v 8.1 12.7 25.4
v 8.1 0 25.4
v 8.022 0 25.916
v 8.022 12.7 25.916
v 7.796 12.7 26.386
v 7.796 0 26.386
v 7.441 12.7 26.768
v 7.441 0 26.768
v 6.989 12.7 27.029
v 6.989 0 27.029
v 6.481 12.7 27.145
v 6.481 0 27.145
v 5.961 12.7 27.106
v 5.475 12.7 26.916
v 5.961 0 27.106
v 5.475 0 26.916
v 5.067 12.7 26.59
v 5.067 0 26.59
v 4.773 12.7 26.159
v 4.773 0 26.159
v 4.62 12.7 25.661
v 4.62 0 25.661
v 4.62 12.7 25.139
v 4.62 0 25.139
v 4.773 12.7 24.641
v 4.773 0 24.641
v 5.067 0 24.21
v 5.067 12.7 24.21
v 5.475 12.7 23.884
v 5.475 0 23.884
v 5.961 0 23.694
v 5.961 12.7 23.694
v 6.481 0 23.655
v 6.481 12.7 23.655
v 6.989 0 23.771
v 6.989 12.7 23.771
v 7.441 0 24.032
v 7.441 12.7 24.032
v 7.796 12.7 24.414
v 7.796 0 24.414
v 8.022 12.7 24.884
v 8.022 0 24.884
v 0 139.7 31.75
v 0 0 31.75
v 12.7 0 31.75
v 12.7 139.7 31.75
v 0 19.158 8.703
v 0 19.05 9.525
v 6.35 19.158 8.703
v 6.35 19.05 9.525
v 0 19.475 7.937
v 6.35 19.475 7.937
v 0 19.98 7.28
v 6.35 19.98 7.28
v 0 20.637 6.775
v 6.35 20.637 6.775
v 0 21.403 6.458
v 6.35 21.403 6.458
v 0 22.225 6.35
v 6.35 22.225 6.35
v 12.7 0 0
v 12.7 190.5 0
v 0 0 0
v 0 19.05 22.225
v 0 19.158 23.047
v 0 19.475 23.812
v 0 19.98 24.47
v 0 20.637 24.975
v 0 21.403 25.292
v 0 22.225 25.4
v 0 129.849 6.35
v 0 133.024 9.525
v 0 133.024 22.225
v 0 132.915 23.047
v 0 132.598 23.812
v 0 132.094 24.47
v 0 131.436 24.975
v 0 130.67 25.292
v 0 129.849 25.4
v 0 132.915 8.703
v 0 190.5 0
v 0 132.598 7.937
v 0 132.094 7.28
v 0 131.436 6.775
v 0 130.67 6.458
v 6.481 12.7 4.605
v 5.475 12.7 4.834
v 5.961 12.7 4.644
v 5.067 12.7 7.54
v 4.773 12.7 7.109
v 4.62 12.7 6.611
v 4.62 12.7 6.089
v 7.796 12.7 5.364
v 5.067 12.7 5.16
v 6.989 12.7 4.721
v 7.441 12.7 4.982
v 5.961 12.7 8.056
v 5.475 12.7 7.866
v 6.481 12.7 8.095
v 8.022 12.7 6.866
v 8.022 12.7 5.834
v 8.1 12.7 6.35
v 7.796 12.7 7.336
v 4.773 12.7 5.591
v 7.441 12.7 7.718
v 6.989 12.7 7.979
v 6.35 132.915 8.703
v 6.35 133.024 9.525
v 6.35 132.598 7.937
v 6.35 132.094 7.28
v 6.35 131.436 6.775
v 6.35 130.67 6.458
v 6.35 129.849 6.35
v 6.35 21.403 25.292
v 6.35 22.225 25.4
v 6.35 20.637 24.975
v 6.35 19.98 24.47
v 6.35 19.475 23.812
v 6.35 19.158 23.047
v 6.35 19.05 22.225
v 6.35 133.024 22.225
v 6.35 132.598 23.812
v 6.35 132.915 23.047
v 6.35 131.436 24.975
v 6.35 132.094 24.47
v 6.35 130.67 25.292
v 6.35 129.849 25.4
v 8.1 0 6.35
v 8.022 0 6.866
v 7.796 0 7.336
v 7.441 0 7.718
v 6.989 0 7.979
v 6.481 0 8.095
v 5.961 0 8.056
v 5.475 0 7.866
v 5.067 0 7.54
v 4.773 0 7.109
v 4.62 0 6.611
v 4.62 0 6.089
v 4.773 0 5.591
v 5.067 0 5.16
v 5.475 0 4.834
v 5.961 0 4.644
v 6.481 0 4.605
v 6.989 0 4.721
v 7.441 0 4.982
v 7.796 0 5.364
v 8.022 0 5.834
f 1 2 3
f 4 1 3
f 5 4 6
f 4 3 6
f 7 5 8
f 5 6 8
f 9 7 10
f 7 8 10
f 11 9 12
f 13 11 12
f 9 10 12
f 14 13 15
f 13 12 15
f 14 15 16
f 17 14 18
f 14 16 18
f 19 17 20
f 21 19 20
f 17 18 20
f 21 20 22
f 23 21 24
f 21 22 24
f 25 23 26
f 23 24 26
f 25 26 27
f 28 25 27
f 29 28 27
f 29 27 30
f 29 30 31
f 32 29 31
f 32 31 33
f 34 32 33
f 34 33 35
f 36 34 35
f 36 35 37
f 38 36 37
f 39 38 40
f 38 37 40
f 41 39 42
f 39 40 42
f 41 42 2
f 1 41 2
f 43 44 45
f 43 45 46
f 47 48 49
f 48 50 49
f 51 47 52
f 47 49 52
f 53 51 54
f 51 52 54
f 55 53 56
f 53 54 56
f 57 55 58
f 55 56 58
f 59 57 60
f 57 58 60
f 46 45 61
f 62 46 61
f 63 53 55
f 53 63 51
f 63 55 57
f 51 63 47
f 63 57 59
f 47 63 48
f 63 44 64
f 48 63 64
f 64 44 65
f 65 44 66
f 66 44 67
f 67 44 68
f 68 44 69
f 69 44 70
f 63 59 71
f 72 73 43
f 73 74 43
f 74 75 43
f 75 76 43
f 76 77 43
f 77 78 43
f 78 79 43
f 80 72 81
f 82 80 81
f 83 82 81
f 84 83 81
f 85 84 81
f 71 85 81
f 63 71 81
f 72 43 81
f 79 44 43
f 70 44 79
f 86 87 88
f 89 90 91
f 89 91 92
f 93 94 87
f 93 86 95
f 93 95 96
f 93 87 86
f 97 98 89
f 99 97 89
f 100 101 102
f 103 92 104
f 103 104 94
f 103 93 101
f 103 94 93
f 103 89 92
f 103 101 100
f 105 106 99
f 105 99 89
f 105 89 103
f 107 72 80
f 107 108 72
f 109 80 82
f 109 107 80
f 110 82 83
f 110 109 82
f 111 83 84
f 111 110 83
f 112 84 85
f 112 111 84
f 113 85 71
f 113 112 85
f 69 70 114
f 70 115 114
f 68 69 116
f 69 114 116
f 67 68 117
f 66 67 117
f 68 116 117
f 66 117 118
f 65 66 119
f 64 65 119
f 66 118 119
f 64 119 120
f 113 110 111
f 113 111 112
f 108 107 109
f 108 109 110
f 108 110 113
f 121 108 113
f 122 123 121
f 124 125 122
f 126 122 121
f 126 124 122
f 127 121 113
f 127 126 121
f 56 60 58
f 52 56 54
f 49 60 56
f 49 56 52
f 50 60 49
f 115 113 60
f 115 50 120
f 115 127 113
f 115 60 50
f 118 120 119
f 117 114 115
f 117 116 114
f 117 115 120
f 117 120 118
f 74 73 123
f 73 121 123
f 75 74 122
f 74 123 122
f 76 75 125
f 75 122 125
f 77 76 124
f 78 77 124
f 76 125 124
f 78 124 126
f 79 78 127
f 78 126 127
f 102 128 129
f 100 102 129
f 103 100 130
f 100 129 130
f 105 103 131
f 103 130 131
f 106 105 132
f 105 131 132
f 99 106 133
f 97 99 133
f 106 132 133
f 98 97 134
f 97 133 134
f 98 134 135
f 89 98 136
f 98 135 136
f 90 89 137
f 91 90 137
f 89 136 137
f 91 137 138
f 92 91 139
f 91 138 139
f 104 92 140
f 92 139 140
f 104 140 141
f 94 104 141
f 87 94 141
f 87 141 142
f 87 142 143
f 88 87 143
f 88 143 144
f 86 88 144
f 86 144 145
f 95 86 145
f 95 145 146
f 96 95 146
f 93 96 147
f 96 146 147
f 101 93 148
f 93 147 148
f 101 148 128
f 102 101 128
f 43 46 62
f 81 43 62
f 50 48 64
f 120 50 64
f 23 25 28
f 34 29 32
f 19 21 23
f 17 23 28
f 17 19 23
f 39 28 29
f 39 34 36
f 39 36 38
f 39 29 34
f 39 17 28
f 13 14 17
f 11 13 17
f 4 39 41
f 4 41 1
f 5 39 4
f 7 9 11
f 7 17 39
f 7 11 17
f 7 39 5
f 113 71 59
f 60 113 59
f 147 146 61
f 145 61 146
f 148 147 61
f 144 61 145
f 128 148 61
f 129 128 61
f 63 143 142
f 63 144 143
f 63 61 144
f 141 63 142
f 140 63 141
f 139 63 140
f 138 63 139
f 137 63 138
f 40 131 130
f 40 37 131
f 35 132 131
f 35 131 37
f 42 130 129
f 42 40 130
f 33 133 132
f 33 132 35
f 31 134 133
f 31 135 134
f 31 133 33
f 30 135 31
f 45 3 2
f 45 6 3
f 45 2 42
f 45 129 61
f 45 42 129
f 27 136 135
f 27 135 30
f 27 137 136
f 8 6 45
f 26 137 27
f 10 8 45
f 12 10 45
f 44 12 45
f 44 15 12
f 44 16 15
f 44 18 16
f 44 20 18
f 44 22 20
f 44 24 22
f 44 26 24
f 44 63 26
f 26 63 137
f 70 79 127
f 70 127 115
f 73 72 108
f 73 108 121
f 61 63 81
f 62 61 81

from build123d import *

# Parameters (mm, degrees)
F0_W     = 190.5
F0_H     = 31.75
F1_DEPTH = 12.7
F3_DEPTH = 25.4
F4_R     = 1.75
F5_DEPTH = 12.7
F6_W     = 113.973523
F6_H     = 19.05
F7_DEPTH = 6.35
F8_R     = 3.175


with BuildPart() as f1:
    # F0 (on Right) → F1 (new body)
    with BuildSketch(Plane.YZ):
        with Locations((95.25, 15.875)):
            Rectangle(F0_W, F0_H)
    extrude(amount=F1_DEPTH)

    # F2 (on face) → F3 (cut)
    with BuildSketch(Plane.YZ.offset(12.7)):
        Polygon((139.7, 31.75), (190.5, 0), (190.5, 31.75), align=None)
    extrude(amount=-F3_DEPTH, mode=Mode.SUBTRACT)

    # F4 (on face) → F5 (cut)
    with BuildSketch(Plane.XZ):
        with Locations((6.35, 6.35)):
            Circle(F4_R)
        with Locations((6.35, 25.4)):
            Circle(F4_R)
    extrude(amount=-F5_DEPTH, mode=Mode.SUBTRACT)

    # F6 (on face) → F7 (cut)
    with BuildSketch(Plane(origin=(0, 0, 0), x_dir=(0, -1, 0), z_dir=(-1, 0, 0))):
        with Locations((-76.036761, 15.875)):
            Rectangle(F6_W, F6_H)
    extrude(amount=-F7_DEPTH, mode=Mode.SUBTRACT)

    # F8
    f8_edges = [f1.edges().sort_by_distance(p)[0] for p in [
        (3.175, 133.023523, 25.4),
        (3.175, 19.05, 25.4),
        (3.175, 19.05, 6.35),
        (3.175, 133.023523, 6.35),
    ]]
    fillet(f8_edges, radius=F8_R)


solid = f1.part
